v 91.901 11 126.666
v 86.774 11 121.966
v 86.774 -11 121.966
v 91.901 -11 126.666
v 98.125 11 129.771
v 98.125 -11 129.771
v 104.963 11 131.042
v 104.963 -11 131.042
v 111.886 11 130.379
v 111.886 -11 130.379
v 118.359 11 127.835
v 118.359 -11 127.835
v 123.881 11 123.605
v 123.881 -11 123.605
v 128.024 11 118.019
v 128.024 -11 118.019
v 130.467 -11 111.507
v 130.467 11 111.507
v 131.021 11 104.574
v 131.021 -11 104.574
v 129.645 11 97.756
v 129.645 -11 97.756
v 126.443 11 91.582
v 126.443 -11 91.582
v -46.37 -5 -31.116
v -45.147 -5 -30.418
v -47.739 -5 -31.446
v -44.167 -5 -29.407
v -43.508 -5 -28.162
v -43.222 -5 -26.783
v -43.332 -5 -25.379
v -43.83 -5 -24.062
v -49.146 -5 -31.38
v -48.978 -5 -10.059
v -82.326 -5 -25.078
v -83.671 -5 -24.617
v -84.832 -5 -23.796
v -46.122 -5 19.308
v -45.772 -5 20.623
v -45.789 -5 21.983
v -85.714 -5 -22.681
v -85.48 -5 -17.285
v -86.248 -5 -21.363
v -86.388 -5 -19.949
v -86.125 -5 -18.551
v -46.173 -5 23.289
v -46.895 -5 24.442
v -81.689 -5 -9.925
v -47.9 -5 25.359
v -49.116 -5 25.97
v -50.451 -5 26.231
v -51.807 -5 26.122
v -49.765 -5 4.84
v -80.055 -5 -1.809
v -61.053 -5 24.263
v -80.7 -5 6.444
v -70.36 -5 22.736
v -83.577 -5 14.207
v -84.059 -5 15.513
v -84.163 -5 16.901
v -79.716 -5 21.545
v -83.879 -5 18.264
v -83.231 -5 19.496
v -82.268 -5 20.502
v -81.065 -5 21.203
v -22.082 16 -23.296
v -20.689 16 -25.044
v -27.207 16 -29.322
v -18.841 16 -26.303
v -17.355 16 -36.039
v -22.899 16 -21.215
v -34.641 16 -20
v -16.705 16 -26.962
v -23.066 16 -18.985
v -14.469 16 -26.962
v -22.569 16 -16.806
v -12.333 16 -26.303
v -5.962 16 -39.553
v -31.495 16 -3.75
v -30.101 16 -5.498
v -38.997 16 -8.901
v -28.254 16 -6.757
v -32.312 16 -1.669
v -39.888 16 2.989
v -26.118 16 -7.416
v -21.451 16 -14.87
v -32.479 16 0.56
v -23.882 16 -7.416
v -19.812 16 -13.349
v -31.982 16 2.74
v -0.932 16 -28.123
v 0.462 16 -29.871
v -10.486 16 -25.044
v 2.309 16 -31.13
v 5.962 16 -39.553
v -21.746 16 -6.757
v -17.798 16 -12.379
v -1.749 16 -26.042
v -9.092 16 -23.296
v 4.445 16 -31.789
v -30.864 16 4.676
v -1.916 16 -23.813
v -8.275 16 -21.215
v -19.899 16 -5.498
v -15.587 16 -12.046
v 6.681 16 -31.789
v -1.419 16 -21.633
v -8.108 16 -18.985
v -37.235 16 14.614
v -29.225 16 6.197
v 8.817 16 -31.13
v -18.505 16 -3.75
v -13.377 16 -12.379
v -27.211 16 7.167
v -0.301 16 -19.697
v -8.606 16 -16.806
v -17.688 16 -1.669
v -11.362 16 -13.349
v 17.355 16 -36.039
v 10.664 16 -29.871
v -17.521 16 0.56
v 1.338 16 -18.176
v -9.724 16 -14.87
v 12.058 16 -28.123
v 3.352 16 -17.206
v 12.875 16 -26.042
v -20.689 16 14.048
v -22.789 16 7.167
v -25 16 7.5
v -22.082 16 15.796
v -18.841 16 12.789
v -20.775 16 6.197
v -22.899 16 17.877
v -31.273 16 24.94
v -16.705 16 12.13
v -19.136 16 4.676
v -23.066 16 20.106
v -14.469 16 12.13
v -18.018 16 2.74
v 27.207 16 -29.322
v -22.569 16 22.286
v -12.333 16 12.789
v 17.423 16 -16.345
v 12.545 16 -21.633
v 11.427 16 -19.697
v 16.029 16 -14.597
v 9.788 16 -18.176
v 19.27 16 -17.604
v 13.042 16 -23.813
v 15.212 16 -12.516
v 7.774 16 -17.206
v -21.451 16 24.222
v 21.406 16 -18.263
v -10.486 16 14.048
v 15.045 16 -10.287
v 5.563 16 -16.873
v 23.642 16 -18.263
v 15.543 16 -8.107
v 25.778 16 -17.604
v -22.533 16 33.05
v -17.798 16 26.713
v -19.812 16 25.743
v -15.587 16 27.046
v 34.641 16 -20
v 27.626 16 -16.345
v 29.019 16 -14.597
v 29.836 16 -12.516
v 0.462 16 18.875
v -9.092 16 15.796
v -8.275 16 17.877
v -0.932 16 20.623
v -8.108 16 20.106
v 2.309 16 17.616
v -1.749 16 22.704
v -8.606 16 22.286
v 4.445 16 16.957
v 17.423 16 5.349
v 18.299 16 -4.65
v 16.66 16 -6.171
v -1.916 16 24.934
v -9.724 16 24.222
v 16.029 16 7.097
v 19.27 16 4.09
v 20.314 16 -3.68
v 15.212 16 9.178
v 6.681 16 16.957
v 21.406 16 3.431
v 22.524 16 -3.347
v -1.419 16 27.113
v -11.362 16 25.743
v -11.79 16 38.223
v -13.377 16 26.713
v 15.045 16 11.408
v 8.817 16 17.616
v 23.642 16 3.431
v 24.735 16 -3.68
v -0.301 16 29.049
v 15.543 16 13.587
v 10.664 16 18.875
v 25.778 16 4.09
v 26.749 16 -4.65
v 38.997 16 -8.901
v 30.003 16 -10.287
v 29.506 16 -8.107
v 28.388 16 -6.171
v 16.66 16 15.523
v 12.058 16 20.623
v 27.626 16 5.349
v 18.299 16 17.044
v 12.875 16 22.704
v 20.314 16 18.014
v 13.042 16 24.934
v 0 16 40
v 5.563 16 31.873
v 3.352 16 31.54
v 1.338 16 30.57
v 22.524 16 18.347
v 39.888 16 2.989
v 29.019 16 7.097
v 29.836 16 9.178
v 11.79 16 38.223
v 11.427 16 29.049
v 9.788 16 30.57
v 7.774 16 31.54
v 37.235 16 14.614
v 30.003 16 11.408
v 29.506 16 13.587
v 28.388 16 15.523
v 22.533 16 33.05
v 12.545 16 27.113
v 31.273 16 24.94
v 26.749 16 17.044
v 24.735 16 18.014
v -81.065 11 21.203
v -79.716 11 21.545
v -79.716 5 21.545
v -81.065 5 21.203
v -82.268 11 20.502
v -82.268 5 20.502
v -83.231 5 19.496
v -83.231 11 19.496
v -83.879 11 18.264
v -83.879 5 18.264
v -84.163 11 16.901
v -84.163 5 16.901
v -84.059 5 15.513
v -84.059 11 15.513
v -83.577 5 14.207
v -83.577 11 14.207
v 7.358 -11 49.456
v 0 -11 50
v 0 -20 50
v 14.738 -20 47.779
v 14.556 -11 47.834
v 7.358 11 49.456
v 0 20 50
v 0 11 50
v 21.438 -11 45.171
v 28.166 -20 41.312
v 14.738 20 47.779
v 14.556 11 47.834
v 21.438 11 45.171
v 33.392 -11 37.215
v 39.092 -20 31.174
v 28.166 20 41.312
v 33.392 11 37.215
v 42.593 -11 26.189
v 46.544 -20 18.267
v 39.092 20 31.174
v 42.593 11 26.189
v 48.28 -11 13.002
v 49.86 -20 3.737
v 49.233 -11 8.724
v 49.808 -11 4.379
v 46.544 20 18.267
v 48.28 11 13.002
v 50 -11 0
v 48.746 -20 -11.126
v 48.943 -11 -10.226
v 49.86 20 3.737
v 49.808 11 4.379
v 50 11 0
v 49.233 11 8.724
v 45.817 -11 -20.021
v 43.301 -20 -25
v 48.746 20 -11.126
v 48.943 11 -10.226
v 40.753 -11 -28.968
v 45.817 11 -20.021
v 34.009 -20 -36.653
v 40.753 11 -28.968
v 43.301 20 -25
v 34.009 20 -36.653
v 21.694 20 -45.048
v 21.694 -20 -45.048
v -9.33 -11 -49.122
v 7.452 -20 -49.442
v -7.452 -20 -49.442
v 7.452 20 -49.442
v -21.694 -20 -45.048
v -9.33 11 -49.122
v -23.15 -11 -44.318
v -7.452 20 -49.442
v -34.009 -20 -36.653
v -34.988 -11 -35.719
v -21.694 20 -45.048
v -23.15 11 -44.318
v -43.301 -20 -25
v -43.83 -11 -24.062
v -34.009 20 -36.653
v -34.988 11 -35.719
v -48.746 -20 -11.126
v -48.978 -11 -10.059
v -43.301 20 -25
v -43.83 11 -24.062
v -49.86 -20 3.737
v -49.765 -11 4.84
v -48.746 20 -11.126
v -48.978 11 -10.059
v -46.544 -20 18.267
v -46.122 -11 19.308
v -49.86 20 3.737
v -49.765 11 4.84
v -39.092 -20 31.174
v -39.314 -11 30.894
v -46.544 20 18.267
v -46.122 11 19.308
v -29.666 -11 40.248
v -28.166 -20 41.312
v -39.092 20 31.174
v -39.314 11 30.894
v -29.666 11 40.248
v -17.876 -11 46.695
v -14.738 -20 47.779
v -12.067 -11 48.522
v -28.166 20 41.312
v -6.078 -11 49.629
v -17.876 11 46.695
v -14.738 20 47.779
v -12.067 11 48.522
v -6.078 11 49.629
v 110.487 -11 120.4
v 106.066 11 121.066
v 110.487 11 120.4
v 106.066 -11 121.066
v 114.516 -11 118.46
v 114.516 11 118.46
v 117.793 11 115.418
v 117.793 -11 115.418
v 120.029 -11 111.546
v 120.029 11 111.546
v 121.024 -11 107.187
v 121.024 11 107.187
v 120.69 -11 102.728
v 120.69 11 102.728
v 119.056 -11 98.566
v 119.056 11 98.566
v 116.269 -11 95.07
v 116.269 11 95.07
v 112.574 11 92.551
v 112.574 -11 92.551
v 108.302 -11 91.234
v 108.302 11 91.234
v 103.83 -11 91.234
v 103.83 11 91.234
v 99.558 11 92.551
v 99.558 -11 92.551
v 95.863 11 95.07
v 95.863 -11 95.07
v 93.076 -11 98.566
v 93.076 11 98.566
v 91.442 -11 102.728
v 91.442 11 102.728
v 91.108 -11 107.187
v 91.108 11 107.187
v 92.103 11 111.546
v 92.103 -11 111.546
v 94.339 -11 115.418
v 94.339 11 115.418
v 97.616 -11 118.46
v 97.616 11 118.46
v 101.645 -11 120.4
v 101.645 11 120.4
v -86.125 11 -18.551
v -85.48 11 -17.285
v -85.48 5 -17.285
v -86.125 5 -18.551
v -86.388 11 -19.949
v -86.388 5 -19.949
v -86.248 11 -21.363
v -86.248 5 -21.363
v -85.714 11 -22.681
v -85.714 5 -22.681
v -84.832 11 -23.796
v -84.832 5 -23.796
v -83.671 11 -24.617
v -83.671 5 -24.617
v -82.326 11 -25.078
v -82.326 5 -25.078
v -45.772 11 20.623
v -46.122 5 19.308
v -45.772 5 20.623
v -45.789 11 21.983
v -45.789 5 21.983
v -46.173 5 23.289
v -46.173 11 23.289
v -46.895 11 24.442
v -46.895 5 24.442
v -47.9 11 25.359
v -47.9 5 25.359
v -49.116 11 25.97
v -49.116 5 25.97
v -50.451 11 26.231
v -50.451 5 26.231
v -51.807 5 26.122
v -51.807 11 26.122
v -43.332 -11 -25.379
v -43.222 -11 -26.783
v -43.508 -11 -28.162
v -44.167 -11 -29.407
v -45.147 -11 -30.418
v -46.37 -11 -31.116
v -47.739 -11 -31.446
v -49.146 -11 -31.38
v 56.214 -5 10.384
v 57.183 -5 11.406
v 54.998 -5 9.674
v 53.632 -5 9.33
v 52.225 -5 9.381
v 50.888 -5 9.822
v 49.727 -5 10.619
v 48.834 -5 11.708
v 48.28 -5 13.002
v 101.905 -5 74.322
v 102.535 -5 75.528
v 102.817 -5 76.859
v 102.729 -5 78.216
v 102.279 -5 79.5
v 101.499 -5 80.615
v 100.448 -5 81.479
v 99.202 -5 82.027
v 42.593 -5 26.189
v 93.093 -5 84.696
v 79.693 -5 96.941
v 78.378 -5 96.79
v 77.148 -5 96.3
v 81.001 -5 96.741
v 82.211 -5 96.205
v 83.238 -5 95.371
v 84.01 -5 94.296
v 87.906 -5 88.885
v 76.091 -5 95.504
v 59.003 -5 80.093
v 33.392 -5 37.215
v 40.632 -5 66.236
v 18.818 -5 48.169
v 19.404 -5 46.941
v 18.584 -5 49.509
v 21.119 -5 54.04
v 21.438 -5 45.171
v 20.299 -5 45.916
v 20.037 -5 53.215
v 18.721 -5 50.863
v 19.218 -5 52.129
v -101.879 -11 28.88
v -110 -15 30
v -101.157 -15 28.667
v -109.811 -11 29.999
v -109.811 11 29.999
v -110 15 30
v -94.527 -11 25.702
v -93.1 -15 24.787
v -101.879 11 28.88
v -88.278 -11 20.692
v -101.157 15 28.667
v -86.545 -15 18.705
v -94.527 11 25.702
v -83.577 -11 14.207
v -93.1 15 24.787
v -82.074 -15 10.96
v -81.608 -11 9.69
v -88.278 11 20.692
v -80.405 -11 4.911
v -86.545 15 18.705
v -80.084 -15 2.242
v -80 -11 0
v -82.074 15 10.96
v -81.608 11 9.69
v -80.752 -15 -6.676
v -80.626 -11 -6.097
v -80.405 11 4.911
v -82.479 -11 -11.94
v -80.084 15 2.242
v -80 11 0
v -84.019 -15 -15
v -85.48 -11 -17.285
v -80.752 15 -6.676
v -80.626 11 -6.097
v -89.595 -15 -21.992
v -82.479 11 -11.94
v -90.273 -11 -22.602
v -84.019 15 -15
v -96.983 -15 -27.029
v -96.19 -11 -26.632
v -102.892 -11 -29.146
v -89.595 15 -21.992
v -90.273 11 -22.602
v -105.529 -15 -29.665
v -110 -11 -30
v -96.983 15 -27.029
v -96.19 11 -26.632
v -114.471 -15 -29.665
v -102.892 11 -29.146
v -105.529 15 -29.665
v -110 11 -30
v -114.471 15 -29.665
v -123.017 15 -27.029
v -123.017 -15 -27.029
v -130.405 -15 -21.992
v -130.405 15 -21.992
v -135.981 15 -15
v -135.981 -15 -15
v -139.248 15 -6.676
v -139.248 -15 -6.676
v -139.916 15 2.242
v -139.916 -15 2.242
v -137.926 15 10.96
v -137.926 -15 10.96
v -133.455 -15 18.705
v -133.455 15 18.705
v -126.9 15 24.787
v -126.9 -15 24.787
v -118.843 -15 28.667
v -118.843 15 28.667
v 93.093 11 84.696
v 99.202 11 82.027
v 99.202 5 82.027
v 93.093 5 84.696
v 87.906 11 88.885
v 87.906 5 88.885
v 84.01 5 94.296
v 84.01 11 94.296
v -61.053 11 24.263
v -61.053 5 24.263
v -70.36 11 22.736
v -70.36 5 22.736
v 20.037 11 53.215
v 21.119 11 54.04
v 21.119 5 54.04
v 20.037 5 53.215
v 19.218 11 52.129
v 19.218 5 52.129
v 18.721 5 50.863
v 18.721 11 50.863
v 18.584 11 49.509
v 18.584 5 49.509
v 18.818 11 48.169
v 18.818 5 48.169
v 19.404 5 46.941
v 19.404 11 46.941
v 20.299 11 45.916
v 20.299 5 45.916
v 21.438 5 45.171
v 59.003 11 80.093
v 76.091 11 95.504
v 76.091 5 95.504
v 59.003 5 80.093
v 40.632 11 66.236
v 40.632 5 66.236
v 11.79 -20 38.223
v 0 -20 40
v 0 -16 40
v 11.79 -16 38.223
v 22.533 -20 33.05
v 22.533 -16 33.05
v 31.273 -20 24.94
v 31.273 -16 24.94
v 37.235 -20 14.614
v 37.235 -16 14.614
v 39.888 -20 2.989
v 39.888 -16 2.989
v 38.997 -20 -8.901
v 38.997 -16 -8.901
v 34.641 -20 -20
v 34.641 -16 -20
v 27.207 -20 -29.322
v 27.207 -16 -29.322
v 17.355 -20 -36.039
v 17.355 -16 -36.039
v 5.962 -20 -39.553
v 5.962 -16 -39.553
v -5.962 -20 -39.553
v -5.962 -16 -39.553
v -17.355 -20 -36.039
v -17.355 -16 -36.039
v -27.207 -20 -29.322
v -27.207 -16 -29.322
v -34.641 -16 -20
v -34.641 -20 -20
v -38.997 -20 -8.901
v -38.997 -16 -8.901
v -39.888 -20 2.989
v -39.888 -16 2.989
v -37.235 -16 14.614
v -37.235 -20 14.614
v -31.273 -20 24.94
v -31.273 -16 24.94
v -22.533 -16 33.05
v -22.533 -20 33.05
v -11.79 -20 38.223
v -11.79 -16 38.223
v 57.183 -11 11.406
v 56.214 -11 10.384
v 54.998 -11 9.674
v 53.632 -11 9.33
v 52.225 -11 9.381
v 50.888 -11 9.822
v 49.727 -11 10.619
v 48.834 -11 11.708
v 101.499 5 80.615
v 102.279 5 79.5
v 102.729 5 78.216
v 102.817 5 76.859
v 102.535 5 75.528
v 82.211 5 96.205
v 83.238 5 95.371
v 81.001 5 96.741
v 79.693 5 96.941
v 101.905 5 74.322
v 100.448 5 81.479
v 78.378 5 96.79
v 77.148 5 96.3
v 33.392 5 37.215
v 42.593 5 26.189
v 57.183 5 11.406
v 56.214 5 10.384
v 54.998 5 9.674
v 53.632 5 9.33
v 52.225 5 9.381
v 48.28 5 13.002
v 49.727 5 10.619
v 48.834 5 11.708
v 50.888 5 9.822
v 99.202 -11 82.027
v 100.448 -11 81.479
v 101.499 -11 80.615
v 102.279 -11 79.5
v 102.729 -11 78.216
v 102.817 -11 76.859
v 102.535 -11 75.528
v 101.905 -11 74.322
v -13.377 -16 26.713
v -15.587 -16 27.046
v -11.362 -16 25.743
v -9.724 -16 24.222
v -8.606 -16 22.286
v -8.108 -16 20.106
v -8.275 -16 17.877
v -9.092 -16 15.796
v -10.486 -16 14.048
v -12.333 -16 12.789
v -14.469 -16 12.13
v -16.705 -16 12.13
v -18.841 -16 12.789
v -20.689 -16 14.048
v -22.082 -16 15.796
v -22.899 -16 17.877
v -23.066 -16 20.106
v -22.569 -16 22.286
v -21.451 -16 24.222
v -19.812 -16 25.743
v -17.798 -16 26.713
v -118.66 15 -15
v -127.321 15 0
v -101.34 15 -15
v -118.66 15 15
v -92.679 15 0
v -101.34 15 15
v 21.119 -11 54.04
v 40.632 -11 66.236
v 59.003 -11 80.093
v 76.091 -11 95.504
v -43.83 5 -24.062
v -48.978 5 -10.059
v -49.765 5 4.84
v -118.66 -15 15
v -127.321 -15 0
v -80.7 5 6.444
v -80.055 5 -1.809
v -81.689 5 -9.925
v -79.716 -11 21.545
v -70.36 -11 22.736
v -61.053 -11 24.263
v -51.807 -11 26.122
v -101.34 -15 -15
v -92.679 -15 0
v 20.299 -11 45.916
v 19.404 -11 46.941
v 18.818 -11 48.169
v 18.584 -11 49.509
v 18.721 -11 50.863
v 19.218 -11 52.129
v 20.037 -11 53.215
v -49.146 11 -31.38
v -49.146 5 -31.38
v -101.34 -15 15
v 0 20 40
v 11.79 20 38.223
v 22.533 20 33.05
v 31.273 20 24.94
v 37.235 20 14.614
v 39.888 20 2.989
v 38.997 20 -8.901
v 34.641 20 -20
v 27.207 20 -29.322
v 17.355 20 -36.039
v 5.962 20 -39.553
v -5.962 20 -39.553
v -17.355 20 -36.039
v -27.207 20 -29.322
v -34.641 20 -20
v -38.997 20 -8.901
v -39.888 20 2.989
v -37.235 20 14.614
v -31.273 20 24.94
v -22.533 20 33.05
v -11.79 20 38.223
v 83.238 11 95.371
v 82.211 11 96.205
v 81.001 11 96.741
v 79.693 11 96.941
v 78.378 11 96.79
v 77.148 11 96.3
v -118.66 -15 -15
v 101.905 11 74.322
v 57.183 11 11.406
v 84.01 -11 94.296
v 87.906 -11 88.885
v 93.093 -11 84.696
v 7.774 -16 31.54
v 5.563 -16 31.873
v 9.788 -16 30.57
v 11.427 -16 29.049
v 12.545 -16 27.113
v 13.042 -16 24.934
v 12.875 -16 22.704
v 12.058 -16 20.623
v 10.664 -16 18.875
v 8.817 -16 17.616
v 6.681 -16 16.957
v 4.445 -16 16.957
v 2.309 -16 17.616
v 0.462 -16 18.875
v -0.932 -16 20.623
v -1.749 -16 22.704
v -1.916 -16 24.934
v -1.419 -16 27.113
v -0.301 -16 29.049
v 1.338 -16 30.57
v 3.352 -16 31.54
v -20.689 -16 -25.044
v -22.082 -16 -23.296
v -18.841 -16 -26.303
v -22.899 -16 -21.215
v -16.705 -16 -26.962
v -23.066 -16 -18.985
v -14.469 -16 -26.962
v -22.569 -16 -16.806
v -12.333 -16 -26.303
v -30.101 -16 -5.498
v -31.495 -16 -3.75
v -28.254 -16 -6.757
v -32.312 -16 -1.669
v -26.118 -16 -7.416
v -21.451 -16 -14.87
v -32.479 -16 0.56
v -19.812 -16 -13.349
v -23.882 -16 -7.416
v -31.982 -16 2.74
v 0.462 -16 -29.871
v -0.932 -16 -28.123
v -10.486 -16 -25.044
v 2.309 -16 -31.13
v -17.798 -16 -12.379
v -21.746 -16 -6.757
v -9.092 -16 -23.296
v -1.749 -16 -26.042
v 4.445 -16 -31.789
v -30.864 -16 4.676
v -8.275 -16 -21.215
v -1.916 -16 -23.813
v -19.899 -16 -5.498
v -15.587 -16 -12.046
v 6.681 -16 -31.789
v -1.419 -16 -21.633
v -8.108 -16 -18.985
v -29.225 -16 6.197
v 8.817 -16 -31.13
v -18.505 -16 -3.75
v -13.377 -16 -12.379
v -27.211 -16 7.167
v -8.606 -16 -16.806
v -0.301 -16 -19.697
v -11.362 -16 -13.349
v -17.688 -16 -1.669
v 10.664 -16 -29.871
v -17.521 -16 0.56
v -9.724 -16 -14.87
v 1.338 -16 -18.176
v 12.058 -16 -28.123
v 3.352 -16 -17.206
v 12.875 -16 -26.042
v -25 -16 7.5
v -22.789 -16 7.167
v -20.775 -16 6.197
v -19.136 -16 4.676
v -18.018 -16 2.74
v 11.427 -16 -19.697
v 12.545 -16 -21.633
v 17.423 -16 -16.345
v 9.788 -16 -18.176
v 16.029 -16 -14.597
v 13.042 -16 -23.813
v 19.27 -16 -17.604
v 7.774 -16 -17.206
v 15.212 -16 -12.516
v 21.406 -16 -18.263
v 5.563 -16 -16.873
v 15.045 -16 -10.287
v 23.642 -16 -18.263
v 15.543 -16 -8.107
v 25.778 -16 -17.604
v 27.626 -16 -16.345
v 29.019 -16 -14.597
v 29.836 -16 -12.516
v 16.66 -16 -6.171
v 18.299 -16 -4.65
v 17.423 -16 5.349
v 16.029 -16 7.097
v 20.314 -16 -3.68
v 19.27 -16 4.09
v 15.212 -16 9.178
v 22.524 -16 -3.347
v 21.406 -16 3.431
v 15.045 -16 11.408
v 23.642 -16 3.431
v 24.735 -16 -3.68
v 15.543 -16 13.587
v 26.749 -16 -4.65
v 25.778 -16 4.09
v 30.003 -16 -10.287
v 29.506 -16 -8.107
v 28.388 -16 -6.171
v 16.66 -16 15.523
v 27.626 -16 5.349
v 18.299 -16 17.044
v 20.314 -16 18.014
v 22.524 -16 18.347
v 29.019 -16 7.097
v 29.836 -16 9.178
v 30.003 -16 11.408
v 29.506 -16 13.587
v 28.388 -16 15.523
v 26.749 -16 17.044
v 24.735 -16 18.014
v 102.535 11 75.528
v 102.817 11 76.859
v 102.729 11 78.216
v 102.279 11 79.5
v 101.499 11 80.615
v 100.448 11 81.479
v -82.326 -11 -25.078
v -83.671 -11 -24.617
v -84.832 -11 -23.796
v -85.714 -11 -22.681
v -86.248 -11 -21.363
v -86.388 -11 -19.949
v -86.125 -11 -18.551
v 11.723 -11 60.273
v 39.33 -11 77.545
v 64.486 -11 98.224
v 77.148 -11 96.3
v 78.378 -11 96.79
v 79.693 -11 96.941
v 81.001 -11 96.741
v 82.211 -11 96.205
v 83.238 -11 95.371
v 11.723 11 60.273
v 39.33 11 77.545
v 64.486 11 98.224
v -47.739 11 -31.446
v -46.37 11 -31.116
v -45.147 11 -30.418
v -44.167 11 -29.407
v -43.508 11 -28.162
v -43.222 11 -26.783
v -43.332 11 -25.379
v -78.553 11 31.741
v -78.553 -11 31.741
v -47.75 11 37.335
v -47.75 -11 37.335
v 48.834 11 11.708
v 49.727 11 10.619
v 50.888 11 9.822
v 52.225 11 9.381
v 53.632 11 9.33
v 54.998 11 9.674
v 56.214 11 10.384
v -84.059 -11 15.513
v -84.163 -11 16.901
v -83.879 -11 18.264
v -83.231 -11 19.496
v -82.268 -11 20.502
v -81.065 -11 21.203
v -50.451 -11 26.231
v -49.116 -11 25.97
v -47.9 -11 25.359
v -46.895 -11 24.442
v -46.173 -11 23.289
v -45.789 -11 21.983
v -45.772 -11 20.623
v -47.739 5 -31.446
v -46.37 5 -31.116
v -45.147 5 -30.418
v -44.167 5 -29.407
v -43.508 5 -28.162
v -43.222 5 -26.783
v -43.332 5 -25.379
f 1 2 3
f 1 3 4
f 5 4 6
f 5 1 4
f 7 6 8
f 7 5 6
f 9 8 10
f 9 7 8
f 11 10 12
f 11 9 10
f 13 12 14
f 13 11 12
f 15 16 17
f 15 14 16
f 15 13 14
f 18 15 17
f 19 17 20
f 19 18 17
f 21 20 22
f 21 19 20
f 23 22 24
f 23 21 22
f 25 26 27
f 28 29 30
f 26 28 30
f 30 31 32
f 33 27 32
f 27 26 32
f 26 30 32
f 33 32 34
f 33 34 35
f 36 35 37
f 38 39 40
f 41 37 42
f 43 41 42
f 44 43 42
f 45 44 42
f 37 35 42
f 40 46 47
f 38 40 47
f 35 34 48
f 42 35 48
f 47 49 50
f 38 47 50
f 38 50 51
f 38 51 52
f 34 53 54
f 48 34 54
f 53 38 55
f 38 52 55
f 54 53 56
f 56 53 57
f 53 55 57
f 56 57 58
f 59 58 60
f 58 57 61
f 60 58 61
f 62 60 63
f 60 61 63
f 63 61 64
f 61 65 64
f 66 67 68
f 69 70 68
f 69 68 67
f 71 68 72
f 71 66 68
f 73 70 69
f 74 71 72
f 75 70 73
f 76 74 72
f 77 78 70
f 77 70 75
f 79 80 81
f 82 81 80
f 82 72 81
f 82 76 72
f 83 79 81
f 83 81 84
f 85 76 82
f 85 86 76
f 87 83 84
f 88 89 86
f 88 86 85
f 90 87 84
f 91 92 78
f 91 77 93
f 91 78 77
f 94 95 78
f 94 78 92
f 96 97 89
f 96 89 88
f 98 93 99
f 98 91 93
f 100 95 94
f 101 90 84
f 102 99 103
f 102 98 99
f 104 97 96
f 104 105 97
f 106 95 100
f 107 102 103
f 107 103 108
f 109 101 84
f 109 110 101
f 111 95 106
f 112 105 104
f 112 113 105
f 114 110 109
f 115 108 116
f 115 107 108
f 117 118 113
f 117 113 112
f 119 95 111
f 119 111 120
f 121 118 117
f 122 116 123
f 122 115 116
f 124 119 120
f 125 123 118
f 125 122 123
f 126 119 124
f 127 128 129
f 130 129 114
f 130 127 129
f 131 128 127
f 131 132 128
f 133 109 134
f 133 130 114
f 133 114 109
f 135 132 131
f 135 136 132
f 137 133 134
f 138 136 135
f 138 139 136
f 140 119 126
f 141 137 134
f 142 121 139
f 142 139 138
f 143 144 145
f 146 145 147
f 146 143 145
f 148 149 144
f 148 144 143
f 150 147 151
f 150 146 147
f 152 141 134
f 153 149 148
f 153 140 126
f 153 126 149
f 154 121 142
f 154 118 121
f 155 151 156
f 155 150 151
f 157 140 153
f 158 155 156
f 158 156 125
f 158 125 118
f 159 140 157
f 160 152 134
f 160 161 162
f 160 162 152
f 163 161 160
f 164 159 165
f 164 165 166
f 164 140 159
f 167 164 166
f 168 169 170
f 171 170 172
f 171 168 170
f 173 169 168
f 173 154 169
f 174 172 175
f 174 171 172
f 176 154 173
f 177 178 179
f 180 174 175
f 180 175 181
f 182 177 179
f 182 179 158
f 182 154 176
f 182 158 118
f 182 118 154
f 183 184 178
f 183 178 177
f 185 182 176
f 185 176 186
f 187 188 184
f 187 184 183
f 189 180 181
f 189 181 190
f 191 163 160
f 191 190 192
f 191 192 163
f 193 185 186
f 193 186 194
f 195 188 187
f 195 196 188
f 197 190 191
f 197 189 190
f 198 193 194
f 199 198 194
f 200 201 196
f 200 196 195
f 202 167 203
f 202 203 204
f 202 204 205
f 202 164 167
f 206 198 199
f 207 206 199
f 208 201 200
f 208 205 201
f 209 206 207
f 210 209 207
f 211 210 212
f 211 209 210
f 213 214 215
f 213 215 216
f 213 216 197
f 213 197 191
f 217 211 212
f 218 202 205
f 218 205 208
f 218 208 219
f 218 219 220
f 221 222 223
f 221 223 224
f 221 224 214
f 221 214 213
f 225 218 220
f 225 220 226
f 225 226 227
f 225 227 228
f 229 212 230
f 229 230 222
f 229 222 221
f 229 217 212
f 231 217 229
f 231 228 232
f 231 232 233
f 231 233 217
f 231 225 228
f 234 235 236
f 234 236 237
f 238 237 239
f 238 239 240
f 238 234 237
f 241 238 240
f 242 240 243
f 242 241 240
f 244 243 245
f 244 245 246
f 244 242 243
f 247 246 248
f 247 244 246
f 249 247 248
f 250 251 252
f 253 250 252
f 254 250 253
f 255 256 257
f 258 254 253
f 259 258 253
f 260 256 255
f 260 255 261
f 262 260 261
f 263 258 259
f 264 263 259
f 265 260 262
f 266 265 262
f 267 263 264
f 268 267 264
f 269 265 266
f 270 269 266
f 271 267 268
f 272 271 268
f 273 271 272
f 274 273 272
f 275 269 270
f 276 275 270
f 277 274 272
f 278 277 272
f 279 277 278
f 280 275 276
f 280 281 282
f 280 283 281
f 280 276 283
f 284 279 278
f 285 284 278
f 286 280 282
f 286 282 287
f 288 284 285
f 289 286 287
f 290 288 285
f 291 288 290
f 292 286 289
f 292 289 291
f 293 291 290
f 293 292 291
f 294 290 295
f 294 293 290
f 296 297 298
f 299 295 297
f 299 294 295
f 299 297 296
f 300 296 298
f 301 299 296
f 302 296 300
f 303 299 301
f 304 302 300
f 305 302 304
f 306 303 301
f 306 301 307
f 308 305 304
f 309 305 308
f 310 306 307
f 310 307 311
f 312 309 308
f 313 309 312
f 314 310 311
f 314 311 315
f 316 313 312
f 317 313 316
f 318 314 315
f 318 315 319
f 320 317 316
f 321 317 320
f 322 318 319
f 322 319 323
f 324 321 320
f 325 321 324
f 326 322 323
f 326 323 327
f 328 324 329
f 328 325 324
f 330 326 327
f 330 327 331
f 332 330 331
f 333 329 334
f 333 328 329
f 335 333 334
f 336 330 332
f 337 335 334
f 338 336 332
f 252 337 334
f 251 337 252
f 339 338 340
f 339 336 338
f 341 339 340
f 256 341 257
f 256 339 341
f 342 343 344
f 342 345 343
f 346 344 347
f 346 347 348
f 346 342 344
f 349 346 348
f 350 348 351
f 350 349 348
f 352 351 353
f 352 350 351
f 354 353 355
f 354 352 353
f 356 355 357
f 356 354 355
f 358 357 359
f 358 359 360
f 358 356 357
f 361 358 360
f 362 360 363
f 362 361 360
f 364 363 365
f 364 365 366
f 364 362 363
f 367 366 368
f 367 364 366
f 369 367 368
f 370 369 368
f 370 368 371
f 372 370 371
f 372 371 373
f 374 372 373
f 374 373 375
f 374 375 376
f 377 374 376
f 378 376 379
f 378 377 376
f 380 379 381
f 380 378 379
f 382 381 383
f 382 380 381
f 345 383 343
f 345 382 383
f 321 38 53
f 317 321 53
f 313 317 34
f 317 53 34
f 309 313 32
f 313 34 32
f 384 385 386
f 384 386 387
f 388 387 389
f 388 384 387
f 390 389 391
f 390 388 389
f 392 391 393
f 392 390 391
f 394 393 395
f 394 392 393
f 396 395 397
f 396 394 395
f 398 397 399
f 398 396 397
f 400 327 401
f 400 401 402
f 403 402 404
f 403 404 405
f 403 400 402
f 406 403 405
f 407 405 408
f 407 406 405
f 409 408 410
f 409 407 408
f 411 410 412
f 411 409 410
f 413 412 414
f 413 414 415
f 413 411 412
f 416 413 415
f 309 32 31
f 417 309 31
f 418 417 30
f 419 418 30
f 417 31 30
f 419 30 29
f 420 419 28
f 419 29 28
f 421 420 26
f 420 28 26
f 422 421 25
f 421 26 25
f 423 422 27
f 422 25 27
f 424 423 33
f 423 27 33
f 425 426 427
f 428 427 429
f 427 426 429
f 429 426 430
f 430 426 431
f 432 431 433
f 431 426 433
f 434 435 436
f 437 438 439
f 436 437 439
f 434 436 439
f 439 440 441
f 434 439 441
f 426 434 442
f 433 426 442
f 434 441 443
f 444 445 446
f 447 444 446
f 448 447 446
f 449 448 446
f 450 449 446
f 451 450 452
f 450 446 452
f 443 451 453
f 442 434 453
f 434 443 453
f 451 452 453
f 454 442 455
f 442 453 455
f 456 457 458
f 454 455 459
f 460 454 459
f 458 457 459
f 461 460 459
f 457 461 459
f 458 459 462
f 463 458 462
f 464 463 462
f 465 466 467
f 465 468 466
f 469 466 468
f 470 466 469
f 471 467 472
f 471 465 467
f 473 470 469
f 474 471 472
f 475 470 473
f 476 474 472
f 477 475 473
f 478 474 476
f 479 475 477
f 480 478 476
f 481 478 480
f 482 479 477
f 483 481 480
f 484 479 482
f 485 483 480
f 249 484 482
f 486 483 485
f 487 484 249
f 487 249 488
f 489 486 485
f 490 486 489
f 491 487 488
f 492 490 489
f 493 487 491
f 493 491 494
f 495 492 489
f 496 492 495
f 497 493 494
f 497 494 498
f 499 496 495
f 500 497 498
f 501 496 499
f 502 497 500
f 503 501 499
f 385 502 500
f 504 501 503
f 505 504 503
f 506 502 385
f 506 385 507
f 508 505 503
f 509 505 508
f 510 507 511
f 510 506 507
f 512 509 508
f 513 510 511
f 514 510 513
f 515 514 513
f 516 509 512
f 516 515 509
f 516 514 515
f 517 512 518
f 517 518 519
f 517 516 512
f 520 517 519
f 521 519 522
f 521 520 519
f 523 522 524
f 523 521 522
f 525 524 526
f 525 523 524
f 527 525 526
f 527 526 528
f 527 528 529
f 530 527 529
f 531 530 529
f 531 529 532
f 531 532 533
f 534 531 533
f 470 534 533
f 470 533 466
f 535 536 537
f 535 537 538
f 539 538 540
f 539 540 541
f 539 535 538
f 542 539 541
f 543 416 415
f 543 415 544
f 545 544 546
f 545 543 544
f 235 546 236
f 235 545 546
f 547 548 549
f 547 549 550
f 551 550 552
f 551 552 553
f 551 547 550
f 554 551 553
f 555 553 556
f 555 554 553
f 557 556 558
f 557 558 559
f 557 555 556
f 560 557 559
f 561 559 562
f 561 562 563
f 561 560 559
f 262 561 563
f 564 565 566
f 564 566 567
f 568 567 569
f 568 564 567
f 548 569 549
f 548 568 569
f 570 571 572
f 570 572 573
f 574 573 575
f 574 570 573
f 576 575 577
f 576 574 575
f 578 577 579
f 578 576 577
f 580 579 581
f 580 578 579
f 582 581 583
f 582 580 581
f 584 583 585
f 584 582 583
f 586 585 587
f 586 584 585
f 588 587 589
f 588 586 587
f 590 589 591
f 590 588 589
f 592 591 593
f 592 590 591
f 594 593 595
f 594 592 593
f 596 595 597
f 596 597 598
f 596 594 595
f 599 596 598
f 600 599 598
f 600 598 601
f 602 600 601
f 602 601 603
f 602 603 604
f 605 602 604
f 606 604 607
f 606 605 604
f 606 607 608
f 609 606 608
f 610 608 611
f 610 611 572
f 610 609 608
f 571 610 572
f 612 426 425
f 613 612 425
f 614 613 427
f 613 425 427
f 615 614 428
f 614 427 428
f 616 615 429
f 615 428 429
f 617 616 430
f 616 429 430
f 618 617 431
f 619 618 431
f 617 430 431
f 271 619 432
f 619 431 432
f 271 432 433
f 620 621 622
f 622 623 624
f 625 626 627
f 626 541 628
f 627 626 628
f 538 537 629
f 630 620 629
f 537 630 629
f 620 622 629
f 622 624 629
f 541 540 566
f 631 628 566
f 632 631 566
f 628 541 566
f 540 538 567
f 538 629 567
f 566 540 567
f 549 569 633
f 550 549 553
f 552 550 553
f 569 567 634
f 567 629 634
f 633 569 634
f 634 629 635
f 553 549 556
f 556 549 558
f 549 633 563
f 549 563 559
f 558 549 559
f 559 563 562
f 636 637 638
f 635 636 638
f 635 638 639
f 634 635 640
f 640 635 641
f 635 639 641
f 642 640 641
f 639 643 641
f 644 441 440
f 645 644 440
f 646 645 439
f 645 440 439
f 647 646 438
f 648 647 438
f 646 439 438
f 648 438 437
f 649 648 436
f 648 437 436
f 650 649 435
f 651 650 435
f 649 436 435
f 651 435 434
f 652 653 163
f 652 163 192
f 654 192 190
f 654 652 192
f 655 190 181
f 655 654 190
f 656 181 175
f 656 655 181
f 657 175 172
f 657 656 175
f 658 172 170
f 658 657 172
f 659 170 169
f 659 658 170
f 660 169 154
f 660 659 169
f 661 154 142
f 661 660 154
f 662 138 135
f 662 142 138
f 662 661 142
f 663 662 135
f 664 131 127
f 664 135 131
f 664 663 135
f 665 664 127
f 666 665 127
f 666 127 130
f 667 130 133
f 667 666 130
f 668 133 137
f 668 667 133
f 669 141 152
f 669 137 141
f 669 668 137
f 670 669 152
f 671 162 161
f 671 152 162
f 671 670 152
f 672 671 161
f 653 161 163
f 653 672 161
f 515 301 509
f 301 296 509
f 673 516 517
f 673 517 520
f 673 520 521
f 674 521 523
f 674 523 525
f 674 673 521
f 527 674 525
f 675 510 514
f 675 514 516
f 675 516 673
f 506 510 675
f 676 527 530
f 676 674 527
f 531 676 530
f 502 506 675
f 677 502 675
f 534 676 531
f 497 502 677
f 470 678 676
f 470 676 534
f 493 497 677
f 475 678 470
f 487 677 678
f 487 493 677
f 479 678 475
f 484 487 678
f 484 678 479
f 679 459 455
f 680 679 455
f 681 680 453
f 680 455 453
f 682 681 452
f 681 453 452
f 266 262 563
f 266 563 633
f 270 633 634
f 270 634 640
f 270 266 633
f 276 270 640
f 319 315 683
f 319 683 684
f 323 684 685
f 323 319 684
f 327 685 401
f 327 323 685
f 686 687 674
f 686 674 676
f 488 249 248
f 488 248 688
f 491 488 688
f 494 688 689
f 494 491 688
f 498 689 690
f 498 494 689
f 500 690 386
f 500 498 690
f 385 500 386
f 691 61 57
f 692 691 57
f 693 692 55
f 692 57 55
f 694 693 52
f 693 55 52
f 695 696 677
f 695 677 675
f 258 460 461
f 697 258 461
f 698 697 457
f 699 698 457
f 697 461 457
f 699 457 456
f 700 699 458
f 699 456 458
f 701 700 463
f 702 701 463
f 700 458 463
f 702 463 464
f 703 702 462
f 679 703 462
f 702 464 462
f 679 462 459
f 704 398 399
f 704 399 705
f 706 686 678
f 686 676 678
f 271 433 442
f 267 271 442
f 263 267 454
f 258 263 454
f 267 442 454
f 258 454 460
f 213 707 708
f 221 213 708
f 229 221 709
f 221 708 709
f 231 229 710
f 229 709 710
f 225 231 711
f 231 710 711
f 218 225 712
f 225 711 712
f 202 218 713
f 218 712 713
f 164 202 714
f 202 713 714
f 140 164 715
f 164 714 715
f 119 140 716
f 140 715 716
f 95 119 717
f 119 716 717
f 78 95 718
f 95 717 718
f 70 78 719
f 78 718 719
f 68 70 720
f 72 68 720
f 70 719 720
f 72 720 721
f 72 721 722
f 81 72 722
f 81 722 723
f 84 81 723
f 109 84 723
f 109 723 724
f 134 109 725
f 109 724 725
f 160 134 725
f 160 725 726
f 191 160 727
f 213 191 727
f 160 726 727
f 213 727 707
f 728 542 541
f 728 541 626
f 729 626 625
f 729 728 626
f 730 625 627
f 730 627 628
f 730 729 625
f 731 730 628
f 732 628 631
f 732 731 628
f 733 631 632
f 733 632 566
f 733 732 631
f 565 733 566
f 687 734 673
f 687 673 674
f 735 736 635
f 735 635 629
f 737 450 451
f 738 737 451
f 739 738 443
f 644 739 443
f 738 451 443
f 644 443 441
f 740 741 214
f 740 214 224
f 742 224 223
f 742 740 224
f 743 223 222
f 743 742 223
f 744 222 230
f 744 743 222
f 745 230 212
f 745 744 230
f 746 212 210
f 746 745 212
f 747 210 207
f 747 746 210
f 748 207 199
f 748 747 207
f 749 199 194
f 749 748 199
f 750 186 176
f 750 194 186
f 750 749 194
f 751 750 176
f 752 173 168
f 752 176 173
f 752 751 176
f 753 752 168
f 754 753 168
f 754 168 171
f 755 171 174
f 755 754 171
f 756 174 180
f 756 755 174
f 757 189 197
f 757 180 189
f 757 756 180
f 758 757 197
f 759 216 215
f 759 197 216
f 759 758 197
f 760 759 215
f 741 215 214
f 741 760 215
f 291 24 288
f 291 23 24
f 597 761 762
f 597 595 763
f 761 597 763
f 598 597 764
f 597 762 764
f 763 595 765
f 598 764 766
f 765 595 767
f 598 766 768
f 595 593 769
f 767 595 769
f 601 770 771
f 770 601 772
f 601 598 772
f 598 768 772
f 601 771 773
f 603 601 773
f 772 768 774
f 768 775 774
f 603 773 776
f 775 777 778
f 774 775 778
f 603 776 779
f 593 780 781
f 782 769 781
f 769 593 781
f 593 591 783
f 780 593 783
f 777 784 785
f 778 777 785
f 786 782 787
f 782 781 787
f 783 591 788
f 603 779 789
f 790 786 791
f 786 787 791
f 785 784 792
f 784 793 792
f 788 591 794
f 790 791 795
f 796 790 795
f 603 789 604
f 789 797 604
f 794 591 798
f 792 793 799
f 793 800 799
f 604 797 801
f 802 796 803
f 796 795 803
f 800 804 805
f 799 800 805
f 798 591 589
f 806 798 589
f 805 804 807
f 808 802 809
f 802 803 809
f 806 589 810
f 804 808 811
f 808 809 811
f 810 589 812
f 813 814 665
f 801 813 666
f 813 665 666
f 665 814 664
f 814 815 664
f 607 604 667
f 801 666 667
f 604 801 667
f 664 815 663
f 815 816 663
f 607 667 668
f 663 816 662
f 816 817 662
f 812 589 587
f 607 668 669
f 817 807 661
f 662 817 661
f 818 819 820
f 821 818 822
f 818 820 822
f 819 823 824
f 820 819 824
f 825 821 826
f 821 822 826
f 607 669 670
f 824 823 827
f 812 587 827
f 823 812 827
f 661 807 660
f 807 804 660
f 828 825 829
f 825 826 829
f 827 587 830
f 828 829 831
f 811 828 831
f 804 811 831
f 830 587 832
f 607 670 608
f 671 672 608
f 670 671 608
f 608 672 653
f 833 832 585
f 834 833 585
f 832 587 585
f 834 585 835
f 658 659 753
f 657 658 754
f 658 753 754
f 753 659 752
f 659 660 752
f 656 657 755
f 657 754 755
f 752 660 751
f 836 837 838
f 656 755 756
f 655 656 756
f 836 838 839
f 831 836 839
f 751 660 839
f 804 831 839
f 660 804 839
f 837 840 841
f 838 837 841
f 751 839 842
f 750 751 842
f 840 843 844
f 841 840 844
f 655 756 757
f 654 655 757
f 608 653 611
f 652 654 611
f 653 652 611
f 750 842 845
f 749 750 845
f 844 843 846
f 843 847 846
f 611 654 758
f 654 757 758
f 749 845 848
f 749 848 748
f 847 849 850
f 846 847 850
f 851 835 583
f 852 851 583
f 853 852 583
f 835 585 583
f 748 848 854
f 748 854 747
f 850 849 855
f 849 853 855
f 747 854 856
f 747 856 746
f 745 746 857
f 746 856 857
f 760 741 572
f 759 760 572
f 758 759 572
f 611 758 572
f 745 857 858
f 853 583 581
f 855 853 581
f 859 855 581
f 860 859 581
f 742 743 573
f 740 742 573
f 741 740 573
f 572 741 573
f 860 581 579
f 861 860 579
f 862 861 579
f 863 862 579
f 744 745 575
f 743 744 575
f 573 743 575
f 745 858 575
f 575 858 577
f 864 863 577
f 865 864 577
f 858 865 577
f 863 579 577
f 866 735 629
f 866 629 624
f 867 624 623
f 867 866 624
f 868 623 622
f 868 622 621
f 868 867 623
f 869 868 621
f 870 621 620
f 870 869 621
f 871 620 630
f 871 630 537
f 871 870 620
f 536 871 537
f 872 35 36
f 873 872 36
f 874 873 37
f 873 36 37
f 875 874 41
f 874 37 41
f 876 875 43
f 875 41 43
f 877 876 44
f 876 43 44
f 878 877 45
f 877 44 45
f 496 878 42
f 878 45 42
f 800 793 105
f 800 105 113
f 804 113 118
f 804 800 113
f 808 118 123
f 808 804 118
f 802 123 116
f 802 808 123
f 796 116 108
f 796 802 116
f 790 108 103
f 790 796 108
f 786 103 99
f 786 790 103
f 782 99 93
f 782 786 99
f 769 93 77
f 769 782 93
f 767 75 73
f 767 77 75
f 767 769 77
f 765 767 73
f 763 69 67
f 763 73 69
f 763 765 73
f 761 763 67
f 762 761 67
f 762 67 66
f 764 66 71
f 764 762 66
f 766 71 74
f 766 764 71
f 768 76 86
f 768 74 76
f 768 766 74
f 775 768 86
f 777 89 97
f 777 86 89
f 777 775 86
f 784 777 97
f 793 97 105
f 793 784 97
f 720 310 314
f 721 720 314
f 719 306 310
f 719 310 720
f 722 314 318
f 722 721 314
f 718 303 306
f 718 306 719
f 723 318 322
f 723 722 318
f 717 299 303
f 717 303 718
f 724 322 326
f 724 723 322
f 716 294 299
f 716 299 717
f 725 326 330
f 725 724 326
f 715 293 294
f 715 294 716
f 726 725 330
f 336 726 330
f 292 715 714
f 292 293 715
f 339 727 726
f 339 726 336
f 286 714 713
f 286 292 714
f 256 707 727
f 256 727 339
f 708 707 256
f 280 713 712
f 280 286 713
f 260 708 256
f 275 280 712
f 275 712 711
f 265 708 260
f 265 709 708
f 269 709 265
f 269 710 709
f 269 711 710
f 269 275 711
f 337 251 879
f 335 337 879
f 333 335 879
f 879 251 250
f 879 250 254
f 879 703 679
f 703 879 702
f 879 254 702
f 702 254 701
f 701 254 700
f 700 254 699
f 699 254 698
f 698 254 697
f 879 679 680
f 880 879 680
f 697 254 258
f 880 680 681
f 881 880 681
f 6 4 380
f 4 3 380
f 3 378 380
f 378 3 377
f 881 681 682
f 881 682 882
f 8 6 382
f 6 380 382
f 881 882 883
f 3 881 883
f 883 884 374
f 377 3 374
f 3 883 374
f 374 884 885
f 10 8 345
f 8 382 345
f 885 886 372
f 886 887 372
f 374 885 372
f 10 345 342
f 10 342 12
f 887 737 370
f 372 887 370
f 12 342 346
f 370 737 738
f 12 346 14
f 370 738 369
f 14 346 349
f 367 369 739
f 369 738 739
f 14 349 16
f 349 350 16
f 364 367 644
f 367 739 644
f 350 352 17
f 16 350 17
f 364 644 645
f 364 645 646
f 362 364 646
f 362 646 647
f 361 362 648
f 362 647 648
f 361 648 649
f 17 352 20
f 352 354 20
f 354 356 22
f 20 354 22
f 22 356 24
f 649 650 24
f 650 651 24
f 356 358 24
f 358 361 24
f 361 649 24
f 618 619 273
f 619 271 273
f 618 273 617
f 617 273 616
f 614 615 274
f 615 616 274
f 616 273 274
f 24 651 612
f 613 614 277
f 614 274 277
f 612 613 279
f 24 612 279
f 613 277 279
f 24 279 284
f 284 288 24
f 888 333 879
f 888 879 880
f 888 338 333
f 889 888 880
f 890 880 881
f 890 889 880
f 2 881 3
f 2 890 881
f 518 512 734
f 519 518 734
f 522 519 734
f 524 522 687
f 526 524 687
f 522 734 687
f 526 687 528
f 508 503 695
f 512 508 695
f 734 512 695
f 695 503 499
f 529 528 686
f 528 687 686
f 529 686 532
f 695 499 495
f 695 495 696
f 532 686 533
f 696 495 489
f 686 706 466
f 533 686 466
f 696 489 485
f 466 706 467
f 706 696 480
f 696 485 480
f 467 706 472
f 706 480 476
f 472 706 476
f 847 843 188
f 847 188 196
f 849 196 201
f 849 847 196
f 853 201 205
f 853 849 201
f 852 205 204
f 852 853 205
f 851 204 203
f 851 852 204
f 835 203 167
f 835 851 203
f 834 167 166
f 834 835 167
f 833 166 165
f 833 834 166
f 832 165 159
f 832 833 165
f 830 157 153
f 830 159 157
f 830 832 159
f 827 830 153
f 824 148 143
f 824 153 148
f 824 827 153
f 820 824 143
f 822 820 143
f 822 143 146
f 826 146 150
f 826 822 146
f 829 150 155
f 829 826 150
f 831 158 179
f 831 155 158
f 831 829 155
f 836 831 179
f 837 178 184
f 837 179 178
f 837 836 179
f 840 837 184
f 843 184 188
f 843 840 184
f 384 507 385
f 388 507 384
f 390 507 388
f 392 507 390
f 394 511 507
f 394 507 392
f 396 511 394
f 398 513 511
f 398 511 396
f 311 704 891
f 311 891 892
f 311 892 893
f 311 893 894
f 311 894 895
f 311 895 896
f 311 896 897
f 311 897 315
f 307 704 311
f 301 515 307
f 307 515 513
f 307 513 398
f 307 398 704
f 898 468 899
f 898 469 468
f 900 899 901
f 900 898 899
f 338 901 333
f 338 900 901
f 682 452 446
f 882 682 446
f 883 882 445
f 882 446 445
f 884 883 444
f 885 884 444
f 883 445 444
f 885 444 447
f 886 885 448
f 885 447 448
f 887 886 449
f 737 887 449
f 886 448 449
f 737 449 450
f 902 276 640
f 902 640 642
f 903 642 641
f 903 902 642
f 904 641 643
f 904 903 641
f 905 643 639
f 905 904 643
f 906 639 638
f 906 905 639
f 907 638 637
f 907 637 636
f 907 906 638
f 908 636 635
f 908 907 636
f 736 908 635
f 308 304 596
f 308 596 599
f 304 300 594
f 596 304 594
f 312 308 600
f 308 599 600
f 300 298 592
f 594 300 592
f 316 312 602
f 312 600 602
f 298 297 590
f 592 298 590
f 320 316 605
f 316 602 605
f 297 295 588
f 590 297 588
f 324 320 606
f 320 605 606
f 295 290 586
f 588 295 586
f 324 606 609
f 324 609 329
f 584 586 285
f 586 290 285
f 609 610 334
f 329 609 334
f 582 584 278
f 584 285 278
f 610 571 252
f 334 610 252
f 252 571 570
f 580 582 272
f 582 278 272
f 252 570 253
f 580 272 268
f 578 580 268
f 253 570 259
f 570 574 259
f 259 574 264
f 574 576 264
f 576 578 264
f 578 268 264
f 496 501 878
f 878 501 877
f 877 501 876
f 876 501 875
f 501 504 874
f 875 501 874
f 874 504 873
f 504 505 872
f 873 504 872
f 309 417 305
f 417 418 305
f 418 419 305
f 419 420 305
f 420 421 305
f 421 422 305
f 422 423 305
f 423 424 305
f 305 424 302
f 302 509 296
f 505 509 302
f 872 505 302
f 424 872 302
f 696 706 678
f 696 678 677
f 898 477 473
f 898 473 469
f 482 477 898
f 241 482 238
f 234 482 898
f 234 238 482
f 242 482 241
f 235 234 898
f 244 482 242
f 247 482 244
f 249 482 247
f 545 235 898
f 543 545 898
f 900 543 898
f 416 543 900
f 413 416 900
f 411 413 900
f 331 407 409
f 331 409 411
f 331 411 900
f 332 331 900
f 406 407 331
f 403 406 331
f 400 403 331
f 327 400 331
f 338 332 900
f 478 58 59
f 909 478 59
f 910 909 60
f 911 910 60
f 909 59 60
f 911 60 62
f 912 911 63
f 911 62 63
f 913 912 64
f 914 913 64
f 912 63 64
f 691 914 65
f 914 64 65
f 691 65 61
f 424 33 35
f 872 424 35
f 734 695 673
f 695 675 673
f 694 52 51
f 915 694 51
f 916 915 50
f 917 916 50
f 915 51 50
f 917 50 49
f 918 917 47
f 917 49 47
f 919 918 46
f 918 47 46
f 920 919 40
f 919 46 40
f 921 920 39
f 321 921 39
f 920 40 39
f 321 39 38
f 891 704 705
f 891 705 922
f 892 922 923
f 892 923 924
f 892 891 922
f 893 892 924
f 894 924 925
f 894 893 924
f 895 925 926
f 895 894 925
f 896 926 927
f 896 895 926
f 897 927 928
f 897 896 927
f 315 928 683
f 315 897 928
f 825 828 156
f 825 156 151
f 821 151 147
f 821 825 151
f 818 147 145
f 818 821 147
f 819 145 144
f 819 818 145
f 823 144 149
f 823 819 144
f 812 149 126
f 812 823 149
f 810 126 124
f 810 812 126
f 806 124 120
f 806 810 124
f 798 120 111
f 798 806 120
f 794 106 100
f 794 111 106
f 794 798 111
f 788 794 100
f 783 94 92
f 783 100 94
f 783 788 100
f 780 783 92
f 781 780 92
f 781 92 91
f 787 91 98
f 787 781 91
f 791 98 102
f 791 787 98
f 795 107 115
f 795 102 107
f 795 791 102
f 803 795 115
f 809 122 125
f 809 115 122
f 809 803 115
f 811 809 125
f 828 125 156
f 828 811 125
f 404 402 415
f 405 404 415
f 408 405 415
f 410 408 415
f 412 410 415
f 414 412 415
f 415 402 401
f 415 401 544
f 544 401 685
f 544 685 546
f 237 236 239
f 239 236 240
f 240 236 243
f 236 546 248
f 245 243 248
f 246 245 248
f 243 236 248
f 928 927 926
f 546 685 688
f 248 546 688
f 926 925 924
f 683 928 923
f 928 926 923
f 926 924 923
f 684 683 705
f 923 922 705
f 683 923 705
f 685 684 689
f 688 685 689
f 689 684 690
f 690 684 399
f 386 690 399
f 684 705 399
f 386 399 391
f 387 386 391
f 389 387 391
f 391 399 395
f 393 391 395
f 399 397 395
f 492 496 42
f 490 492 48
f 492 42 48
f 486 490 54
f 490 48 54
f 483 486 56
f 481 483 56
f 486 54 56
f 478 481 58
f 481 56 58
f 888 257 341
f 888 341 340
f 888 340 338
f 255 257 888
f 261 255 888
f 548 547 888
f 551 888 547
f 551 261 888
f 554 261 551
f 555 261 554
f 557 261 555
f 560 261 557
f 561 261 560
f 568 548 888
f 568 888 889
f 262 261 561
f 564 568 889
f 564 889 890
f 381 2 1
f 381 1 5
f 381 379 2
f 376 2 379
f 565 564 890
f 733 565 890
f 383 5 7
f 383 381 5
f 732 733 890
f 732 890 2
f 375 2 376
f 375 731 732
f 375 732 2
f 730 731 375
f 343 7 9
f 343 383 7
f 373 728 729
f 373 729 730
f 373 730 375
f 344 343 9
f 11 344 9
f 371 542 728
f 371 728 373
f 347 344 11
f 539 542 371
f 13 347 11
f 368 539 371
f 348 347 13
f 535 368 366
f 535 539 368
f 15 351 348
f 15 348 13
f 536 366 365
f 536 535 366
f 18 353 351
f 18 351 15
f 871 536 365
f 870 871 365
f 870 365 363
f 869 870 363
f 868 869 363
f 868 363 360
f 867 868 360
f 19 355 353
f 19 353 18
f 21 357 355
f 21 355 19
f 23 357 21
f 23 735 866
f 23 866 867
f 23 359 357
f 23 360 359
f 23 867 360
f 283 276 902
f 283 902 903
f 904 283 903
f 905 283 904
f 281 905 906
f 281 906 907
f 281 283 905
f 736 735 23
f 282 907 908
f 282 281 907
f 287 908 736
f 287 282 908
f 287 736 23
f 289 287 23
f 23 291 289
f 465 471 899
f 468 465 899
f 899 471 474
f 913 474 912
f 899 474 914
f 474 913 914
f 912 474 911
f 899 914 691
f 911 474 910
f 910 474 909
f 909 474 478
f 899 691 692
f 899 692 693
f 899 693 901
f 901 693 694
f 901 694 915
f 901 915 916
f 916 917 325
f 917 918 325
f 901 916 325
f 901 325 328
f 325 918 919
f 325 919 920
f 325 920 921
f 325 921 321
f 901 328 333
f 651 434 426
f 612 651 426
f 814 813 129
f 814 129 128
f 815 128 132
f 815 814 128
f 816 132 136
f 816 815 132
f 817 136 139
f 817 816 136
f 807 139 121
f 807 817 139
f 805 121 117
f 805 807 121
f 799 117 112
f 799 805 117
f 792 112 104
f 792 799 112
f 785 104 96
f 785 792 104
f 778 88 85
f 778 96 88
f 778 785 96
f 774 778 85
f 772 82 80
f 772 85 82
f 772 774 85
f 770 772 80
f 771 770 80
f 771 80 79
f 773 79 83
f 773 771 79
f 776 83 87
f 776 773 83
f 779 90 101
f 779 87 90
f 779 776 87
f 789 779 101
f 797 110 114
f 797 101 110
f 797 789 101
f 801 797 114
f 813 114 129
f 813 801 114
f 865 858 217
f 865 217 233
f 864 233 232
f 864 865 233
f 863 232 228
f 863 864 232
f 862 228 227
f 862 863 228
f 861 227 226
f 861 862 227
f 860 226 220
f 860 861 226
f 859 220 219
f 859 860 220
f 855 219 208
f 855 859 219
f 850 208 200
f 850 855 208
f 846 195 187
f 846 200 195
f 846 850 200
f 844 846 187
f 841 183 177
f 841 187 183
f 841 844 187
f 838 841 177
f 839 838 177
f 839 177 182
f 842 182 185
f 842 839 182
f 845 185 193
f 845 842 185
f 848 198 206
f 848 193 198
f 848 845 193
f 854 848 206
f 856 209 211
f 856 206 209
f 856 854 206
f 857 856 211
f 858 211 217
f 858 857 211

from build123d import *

# Parameters (mm, degrees)
SKETCH_1_R          = 50
SKETCH_1_R_2        = 7.5
EXTRUDE_2_DEPTH     = 20
SKETCH_4_R          = 40
CUT_EXTRUDE_1_DEPTH = 4
SKETCH_6_R          = 30
EXTRUDE_5_DEPTH     = 15
SKETCH_8_R          = 25
SKETCH_8_R_2        = 15
EXTRUDE_6_DEPTH     = 11
EXTRUDE_7_DEPTH     = 11
CUT_EXTRUDE_START   = 11
CUT_EXTRUDE_2_DEPTH = 6
CUT_EXTRUDE_START_2 = -6
CUT_EXTRUDE_3_DEPTH = 6


with BuildPart() as part:
    # 草图1 → 凸台-拉伸2 (new, symmetric)
    with BuildSketch(Plane(origin=(0, 0, 0), x_dir=(1, 0, 0), z_dir=(0, 1, 0))):
        with Locations(Location((0, 0, 0), (0, 0, 270))):
            Circle(SKETCH_1_R)
        with Locations(Location((-25, 0, 0), (0, 0, 270))):
            Circle(SKETCH_1_R_2, mode=Mode.SUBTRACT)
        with Locations(Location((-15.587245046, 19.545787062, 0), (0, 0, 270))):
            Circle(SKETCH_1_R_2, mode=Mode.SUBTRACT)
        with Locations(Location((5.563023349, 24.373197805, 0), (0, 0, 270))):
            Circle(SKETCH_1_R_2, mode=Mode.SUBTRACT)
        with Locations(Location((22.524221698, 10.847093478, 0), (0, 0, 270))):
            Circle(SKETCH_1_R_2, mode=Mode.SUBTRACT)
        with Locations(Location((22.524221698, -10.847093478, 0), (0, 0, 270))):
            Circle(SKETCH_1_R_2, mode=Mode.SUBTRACT)
        with Locations(Location((5.563023349, -24.373197805, 0), (0, 0, 270))):
            Circle(SKETCH_1_R_2, mode=Mode.SUBTRACT)
        with Locations(Location((-15.587245046, -19.545787062, 0), (0, 0, 270))):
            Circle(SKETCH_1_R_2, mode=Mode.SUBTRACT)
    extrude(amount=EXTRUDE_2_DEPTH, both=True)

    # 草图4 → 切除-拉伸1 (cut)
    with BuildSketch(Plane(origin=(0, 20, 0), x_dir=(1, 0, 0), z_dir=(0, 1, 0))):
        with Locations(Location((0, 0, 0), (0, 0, 270))):
            Circle(SKETCH_4_R)
    cut_extrude_1 = extrude(amount=-CUT_EXTRUDE_1_DEPTH, mode=Mode.SUBTRACT)

    # 镜向1: 切除-拉伸1 across plane
    add(cut_extrude_1.mirror(Plane.ZX), mode=Mode.SUBTRACT)



with BuildPart() as body_2:
    # 草图6 → 凸台-拉伸5 (new, symmetric)
    with BuildSketch(Plane(origin=(0, 0, 0), x_dir=(1, 0, 0), z_dir=(0, 1, 0))):
        with Locations(Location((-110, 0, 0), (0, 0, 270))):
            Circle(SKETCH_6_R)
        Polygon((-92.679491924, 0), (-101.339745962, 15), (-118.660254038, 15), (-127.320508076, 0), (-118.660254038, -15), (-101.339745962, -15), align=None, mode=Mode.SUBTRACT)
    extrude(amount=EXTRUDE_5_DEPTH, both=True)


with BuildPart() as body_3:
    # 草图8 → 凸台-拉伸6 (new, symmetric)
    with BuildSketch(Plane(origin=(0, 0, 0), x_dir=(1, 0, 0), z_dir=(0, 1, 0))):
        with Locations(Location((106.066017178, -106.066017178, 0), (0, 0, 270))):
            Circle(SKETCH_8_R)
        with Locations(Location((106.066017178, -106.066017178, 0), (0, 0, 270))):
            Circle(SKETCH_8_R_2, mode=Mode.SUBTRACT)
    extrude(amount=EXTRUDE_6_DEPTH, both=True)


with BuildPart() as part_1:
    add(part.part)

    add(body_2.part)  # 凸台-拉伸7 merges body 2

    add(body_3.part)  # 凸台-拉伸7 merges body 3
    # 草图9 → 凸台-拉伸7 (add, symmetric)
    with BuildSketch(Plane(origin=(0, 0, 0), x_dir=(1, 0, 0), z_dir=(0, 1, 0))):
        with BuildLine():
            Line((-9.330441424, 49.121714779), (-110, 30))
            ThreePointArc((-110, 30), (-88.786796564, 21.213203436), (-80, 0))
            ThreePointArc((-80, 0), (-88.71993646, -21.146131933), (-109.810593048, -29.999402077))
            ThreePointArc((-109.810593048, -29.999402077), (-63.064827616, -34.060904943), (-17.875950367, -46.695293108))
            ThreePointArc((-17.875950367, -46.695293108), (-49.802326137, 4.44165637), (-9.330441424, 49.121714779))
        make_face()
        with BuildLine():
            Line((126.442712652, -91.581878213), (40.753390949, 28.968277929))
            ThreePointArc((40.753390949, 28.968277929), (47.632287093, 15.204118727), (50, 0))
            ThreePointArc((50, 0), (28.33904093, -41.19343102), (-17.875950367, -46.695293108))
            ThreePointArc((-17.875950367, -46.695293108), (39.329861169, -77.545156319), (86.774183491, -121.966493681))
            ThreePointArc((86.774183491, -121.966493681), (90.864028968, -86.219114285), (126.442712652, -91.581878213))
        make_face()
    extrude(amount=EXTRUDE_7_DEPTH, both=True)

    # 草图10 → 切除-拉伸2 (cut)
    with BuildSketch(Plane(origin=(0, 0, 0), x_dir=(1, 0, 0), z_dir=(0, 1, 0)).offset(CUT_EXTRUDE_START)):
        with BuildLine():
            ThreePointArc((-43.829514678, 24.061871148), (-49.930321788, 2.638743289), (-46.121552708, -19.308090941))
            ThreePointArc((-46.121552708, -19.308090941), (-46.894642878, -24.442270002), (-51.807391271, -26.122259963))
            ThreePointArc((-51.807391271, -26.122259963), (-65.699920333, -23.457746699), (-79.715740029, -21.544949554))
            ThreePointArc((-79.715740029, -21.544949554), (-83.598085675, -18.902773341), (-83.577090418, -14.206683259))
            ThreePointArc((-83.577090418, -14.206683259), (-80.054612182, 1.80935028), (-85.479855197, 17.284747578))
            ThreePointArc((-85.479855197, 17.284747578), (-86.028032441, 22.041171589), (-82.326208539, 25.077710319))
            Line((-82.326208539, 25.077710319), (-49.145510288, 31.38022974))
            ThreePointArc((-49.145510288, 31.38022974), (-44.167091223, 29.4065854), (-43.829514678, 24.061871148))
        make_face()
        with BuildLine():
            ThreePointArc((99.202471828, -82.026638126), (90.358856707, -86.616464228), (84.010192893, -94.295689438))
            ThreePointArc((84.010192893, -94.295689438), (80.353400569, -96.884388509), (76.090892576, -95.504345545))
            ThreePointArc((76.090892576, -95.504345545), (49.969670312, -72.96331305), (21.11948881, -54.040220653))
            ThreePointArc((21.11948881, -54.040220653), (18.584494671, -49.509076454), (21.437529998, -45.171144635))
            ThreePointArc((21.437529998, -45.171144635), (38.390543683, -32.033828303), (48.279793254, -13.002367605))
            ThreePointArc((48.279793254, -13.002367605), (52.22522368, -9.381109934), (57.183111675, -11.405776572))
            Line((57.183111675, -11.405776572), (101.905101852, -74.321934522))
            ThreePointArc((101.905101852, -74.321934522), (102.547910869, -78.873778446), (99.202471828, -82.026638126))
        make_face()
    extrude(amount=-CUT_EXTRUDE_2_DEPTH, mode=Mode.SUBTRACT)

    # 草图11 → 切除-拉伸3 (cut)
    with BuildSketch(Plane.XZ.offset(11).offset(CUT_EXTRUDE_START_2)):
        with BuildLine():
            Line((101.905101852, 74.321934522), (57.183111675, 11.405776572))
            ThreePointArc((57.183111675, 11.405776572), (52.22522368, 9.381109934), (48.279793254, 13.002367605))
            ThreePointArc((48.279793254, 13.002367605), (38.390543683, 32.033828303), (21.437529998, 45.171144635))
            ThreePointArc((21.437529998, 45.171144635), (18.584494671, 49.509076454), (21.11948881, 54.040220653))
            ThreePointArc((21.11948881, 54.040220653), (49.969670312, 72.96331305), (76.090892576, 95.504345545))
            ThreePointArc((76.090892576, 95.504345545), (80.353400569, 96.884388509), (84.010192893, 94.295689438))
            ThreePointArc((84.010192893, 94.295689438), (90.358856707, 86.616464228), (99.202471828, 82.026638126))
            ThreePointArc((99.202471828, 82.026638126), (102.547910869, 78.873778446), (101.905101852, 74.321934522))
        make_face()
        with BuildLine():
            Line((-49.145510288, -31.38022974), (-82.326208539, -25.077710319))
            ThreePointArc((-82.326208539, -25.077710319), (-86.028032441, -22.041171589), (-85.479855197, -17.284747578))
            ThreePointArc((-85.479855197, -17.284747578), (-80.054612182, -1.80935028), (-83.577090418, 14.206683259))
            ThreePointArc((-83.577090418, 14.206683259), (-83.598085675, 18.902773341), (-79.715740029, 21.544949554))
            ThreePointArc((-79.715740029, 21.544949554), (-65.699920333, 23.457746699), (-51.807391271, 26.122259963))
            ThreePointArc((-51.807391271, 26.122259963), (-46.894642878, 24.442270002), (-46.121552708, 19.308090941))
            ThreePointArc((-46.121552708, 19.308090941), (-49.930321788, -2.638743289), (-43.829514678, -24.061871148))
            ThreePointArc((-43.829514678, -24.061871148), (-44.167091223, -29.4065854), (-49.145510288, -31.38022974))
        make_face()
    extrude(amount=CUT_EXTRUDE_3_DEPTH, mode=Mode.SUBTRACT)


solid = part_1.part
